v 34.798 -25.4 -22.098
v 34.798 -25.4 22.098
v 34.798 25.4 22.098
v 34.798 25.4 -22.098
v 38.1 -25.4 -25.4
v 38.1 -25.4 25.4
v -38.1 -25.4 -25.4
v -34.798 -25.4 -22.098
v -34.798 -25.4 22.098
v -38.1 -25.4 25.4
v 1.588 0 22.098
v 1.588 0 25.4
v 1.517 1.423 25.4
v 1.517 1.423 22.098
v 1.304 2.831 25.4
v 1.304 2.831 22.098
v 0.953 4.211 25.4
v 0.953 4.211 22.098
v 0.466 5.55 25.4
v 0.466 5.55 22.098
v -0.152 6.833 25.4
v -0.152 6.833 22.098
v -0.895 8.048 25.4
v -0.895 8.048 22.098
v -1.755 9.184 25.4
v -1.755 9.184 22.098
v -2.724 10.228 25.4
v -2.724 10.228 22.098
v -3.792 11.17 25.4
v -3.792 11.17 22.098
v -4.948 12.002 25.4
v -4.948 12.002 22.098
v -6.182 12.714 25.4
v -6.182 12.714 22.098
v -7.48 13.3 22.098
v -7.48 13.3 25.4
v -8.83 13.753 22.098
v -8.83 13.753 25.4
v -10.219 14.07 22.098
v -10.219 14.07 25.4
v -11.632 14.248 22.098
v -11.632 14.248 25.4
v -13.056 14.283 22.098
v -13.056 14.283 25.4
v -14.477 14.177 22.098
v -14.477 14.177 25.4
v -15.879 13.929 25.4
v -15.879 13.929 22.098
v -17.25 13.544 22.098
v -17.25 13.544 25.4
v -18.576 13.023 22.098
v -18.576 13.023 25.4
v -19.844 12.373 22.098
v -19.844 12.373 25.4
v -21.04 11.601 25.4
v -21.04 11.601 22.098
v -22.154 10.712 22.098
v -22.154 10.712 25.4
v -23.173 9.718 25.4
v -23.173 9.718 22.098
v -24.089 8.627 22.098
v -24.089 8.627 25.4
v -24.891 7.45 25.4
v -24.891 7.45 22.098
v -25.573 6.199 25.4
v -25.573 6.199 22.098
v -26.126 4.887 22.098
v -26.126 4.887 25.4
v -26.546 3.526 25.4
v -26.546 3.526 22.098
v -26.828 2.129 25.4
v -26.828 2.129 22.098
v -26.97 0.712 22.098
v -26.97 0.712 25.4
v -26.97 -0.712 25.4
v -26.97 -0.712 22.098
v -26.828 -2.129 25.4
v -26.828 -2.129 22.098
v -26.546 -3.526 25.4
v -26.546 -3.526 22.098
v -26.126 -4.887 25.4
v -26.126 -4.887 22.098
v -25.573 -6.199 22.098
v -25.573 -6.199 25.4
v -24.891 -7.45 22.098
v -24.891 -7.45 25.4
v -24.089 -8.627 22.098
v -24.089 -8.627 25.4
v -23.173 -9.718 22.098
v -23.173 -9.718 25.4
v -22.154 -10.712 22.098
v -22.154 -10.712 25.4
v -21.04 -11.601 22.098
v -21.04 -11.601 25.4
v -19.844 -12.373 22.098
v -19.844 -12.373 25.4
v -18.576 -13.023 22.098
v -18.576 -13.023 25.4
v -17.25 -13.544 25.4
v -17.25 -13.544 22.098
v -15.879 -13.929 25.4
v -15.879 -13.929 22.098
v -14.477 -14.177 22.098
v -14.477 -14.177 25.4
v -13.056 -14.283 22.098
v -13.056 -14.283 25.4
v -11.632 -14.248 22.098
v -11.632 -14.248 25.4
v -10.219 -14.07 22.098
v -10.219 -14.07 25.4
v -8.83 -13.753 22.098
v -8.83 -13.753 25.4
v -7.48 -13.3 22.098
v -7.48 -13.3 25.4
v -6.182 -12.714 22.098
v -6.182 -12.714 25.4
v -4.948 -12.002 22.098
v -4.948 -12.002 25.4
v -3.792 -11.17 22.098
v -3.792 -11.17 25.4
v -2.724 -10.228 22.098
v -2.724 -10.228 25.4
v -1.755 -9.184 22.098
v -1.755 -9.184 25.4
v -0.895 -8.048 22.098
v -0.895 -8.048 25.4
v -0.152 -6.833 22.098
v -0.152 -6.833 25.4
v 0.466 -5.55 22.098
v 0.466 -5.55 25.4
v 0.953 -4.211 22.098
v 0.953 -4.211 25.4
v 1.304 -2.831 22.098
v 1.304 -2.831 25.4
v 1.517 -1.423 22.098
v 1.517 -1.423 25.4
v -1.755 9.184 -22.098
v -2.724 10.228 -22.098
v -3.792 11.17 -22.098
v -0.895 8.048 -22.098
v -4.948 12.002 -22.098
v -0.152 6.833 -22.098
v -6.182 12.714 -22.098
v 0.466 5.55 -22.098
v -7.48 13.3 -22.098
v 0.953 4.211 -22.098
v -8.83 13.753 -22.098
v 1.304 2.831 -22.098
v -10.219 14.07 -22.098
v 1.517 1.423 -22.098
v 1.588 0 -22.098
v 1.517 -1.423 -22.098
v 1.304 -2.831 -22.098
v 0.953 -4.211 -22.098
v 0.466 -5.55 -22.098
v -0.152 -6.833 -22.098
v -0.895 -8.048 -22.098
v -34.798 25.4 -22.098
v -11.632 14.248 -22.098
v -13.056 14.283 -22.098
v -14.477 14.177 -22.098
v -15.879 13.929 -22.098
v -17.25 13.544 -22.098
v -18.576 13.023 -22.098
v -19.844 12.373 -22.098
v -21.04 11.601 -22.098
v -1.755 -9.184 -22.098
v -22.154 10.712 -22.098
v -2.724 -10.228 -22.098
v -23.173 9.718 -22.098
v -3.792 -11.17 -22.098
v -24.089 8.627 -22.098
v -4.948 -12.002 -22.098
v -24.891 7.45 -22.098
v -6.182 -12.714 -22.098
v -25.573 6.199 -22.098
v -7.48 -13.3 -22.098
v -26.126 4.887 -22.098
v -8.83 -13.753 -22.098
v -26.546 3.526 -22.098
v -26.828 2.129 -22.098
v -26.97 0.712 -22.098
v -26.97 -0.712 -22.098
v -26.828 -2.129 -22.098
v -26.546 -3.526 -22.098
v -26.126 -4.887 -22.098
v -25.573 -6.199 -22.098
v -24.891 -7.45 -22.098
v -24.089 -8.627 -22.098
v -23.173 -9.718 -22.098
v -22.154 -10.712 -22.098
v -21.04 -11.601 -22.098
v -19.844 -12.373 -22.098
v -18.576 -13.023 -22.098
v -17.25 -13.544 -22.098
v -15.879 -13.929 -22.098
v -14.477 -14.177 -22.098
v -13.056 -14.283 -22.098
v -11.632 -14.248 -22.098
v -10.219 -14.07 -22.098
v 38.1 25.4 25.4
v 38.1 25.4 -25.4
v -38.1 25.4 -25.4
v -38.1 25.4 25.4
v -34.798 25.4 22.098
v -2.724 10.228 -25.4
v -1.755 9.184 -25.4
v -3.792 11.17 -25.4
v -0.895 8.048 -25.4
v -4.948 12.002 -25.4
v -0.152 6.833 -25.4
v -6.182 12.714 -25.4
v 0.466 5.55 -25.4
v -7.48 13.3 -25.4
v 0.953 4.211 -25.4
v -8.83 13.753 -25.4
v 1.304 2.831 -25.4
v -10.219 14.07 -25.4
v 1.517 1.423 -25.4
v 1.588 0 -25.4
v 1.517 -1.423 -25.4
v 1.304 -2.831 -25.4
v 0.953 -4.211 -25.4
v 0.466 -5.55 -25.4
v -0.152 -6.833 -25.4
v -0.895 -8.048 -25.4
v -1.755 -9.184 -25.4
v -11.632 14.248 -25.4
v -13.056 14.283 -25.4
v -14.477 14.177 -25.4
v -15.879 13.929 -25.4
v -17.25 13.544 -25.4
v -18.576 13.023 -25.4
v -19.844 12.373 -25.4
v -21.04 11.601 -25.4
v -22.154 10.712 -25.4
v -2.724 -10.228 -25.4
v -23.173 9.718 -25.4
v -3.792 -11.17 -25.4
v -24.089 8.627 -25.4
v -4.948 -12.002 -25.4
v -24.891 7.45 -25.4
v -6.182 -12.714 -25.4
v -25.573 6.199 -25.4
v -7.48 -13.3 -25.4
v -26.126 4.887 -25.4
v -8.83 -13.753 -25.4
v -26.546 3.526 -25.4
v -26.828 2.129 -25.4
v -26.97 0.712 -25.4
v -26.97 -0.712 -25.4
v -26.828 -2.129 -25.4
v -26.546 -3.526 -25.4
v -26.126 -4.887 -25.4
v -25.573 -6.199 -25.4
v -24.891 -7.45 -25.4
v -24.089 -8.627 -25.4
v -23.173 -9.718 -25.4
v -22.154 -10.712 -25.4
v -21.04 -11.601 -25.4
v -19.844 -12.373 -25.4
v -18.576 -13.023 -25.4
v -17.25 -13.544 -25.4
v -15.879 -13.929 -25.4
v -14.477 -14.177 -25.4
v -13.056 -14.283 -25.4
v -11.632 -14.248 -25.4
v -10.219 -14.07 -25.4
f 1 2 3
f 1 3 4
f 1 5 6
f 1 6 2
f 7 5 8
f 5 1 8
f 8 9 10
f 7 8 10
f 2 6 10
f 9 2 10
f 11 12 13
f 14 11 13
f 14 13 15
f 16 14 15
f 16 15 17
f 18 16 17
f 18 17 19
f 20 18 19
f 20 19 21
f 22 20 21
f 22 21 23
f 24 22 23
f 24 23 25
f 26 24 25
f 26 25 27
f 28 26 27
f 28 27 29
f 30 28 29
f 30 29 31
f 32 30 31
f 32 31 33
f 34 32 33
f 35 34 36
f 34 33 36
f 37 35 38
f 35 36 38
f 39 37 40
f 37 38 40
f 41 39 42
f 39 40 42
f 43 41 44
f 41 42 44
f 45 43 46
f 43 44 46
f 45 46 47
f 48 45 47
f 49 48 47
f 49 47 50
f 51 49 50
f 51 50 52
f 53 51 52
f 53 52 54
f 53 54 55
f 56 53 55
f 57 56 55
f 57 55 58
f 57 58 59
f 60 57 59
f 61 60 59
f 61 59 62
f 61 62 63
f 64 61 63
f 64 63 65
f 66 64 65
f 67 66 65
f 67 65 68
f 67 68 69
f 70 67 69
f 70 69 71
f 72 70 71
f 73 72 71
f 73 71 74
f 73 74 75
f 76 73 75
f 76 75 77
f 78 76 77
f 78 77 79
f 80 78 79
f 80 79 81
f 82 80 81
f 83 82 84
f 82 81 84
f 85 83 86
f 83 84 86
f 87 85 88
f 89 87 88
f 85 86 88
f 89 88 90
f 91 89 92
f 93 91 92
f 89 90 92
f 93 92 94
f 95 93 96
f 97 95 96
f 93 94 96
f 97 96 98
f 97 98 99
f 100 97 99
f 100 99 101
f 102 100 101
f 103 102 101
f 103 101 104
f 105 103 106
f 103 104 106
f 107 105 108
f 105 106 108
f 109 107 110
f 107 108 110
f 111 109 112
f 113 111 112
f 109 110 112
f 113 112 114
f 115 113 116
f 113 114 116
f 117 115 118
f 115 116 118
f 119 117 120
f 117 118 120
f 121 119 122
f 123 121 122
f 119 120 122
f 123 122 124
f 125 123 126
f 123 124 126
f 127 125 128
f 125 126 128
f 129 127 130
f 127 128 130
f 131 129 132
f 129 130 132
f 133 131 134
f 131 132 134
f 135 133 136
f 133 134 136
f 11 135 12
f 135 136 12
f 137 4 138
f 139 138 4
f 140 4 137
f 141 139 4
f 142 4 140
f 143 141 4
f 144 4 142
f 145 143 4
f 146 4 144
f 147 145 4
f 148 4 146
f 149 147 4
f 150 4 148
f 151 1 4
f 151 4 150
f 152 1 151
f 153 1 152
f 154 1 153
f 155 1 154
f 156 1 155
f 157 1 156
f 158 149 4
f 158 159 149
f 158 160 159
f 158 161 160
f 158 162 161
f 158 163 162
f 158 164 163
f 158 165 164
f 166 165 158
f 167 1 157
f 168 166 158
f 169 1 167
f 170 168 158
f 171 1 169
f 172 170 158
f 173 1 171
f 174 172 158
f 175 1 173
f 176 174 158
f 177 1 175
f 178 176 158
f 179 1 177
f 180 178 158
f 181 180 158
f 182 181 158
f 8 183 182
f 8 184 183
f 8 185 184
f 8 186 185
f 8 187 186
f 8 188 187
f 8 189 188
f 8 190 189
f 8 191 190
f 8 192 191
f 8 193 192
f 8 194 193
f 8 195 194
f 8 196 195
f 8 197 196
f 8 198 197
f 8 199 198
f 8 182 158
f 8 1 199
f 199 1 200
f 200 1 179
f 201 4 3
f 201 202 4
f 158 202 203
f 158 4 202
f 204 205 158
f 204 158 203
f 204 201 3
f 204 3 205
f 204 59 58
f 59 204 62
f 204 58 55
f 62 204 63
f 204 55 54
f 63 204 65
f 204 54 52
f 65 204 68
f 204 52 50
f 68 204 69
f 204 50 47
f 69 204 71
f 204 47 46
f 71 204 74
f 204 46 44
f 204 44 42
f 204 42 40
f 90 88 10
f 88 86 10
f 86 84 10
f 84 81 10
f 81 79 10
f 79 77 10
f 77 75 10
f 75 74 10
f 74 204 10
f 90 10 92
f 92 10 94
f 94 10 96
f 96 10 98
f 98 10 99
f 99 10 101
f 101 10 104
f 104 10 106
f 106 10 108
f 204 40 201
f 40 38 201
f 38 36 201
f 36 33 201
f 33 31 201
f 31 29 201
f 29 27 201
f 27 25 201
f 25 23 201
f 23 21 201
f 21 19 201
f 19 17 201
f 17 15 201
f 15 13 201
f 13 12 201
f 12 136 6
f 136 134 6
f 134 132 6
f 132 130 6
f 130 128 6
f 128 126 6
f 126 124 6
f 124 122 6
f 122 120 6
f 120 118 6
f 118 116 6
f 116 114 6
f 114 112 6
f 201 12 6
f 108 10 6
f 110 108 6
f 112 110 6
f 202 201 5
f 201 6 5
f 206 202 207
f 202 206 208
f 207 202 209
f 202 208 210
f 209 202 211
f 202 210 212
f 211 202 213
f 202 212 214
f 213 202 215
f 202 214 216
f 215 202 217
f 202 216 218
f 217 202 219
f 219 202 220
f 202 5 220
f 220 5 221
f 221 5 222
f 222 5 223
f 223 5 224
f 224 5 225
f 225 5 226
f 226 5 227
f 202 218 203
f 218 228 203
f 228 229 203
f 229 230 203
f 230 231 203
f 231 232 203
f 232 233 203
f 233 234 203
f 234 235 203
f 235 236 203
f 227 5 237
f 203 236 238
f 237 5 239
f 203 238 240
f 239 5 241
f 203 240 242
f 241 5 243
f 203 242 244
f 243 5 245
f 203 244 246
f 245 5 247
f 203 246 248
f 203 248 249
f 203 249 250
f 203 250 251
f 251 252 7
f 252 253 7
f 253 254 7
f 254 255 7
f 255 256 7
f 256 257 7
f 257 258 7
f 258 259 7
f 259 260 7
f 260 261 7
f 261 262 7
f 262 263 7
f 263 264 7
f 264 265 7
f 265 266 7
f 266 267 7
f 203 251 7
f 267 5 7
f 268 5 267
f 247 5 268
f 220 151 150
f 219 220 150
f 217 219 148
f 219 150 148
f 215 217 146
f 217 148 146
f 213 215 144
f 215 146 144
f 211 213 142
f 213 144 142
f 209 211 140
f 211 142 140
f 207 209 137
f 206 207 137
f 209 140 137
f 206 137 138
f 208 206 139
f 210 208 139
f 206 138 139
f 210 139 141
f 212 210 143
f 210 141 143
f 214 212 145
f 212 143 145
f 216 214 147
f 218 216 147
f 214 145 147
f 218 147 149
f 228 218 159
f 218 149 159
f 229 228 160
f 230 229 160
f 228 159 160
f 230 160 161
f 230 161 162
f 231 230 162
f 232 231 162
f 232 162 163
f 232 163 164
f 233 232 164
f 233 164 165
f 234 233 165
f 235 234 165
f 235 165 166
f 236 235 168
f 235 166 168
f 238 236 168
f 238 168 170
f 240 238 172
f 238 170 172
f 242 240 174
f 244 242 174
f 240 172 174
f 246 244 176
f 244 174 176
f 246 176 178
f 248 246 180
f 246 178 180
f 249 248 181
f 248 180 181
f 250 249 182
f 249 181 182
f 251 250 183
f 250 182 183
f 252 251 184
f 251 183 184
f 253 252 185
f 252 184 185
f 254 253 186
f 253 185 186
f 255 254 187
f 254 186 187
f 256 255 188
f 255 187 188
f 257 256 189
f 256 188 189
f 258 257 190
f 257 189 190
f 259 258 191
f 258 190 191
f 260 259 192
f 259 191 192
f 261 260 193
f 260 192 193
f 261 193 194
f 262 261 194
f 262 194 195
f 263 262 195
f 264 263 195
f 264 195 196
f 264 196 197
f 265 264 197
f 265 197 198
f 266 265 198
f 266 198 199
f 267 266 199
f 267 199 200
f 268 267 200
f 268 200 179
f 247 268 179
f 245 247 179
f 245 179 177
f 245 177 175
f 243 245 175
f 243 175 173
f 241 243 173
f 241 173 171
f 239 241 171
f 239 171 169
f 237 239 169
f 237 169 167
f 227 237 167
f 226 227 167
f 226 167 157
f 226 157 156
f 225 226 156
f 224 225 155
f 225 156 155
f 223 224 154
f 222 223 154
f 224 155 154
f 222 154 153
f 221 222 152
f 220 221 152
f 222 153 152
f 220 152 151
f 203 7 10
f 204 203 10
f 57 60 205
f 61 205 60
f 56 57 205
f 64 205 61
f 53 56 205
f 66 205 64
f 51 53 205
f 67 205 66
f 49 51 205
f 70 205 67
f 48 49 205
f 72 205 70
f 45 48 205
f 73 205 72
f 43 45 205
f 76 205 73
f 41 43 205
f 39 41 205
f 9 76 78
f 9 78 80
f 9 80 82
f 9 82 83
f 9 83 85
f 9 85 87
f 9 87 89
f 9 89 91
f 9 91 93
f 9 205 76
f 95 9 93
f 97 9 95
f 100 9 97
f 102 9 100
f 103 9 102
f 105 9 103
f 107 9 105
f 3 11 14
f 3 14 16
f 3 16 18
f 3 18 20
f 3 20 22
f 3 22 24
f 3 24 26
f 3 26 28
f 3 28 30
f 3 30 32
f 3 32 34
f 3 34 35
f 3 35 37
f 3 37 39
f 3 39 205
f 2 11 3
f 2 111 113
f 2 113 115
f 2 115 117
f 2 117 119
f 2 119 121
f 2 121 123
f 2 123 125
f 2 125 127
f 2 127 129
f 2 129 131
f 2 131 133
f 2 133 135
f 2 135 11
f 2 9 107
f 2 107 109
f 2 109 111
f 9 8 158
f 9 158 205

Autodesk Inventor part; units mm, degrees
ref_plane "YZ Plane" through (0, 0, 0) normal (1, 0, 0) x (0, 1, 0)
ref_plane "XZ Plane" through (0, 0, 0) normal (0, 1, 0) x (-1, 0, 0)
ref_plane "XY Plane" through (0, 0, 0) normal (0, 0, 1) x (1, 0, 0)
sketch "Sketch1" plane through (0, 0, 0) normal (0, 1, 0) x (-1, 0, 0)
  point P0 (0, 0)
sketch "Sketch2" plane through (0, 0, 0) normal (0, 1, 0) x (-1, 0, 0)
  line L0 (38.1, 25.4) -> (-38.1, 25.4)
  line L1 (-38.1, 25.4) -> (-38.1, -25.4)
  line L2 (-38.1, -25.4) -> (38.1, -25.4)
  line L3 (38.1, -25.4) -> (38.1, 25.4)
  line L4 (34.798, 22.098) -> (-34.798, 22.098)
  line L5 (-34.798, 22.098) -> (-34.798, -22.098)
  line L6 (-34.798, -22.098) -> (34.798, -22.098)
  line L7 (34.798, -22.098) -> (34.798, 22.098)
  line L8 (0, -35.56) -> (0, 35.56) projected
  line L9 (-53.34, 0) -> (53.34, 0) projected
  point P0 (0, 0)
  dimension "d0" = 3.302
  dimension "d1" = 76.2
  dimension "d2" = 50.8
extrude "Extrusion1" add sketch "Sketch2" along normal mid plane 50.8 contours L3 L9 L7 L4 L8 L0 | L8 L4 L5 L9 L1 L0 | L3 L2 L8 L6 L7 L9 | L9 L5 L6 L8 L2 L1
sketch "Sketch3" plane through (-38.1, -25.4, 25.4) normal (0, 0, 1) x (1, 0, 0)
  circle A0 centre (25.4, 25.4) radius 14.2875
  line L0 (-15.24, 25.4) -> (91.44, 25.4) projected
  line L1 (38.1, 60.96) -> (38.1, -10.16) projected
  line L2 (0, 50.8) -> (0, 0) projected
  point P0 (38.1, 25.4)
  dimension "d5" = 28.575
  dimension "d6" = 25.4
extrude "Extrusion2" cut sketch "Sketch3" against normal up to surface (50.8 mm away)
properties part number "Hinge"
